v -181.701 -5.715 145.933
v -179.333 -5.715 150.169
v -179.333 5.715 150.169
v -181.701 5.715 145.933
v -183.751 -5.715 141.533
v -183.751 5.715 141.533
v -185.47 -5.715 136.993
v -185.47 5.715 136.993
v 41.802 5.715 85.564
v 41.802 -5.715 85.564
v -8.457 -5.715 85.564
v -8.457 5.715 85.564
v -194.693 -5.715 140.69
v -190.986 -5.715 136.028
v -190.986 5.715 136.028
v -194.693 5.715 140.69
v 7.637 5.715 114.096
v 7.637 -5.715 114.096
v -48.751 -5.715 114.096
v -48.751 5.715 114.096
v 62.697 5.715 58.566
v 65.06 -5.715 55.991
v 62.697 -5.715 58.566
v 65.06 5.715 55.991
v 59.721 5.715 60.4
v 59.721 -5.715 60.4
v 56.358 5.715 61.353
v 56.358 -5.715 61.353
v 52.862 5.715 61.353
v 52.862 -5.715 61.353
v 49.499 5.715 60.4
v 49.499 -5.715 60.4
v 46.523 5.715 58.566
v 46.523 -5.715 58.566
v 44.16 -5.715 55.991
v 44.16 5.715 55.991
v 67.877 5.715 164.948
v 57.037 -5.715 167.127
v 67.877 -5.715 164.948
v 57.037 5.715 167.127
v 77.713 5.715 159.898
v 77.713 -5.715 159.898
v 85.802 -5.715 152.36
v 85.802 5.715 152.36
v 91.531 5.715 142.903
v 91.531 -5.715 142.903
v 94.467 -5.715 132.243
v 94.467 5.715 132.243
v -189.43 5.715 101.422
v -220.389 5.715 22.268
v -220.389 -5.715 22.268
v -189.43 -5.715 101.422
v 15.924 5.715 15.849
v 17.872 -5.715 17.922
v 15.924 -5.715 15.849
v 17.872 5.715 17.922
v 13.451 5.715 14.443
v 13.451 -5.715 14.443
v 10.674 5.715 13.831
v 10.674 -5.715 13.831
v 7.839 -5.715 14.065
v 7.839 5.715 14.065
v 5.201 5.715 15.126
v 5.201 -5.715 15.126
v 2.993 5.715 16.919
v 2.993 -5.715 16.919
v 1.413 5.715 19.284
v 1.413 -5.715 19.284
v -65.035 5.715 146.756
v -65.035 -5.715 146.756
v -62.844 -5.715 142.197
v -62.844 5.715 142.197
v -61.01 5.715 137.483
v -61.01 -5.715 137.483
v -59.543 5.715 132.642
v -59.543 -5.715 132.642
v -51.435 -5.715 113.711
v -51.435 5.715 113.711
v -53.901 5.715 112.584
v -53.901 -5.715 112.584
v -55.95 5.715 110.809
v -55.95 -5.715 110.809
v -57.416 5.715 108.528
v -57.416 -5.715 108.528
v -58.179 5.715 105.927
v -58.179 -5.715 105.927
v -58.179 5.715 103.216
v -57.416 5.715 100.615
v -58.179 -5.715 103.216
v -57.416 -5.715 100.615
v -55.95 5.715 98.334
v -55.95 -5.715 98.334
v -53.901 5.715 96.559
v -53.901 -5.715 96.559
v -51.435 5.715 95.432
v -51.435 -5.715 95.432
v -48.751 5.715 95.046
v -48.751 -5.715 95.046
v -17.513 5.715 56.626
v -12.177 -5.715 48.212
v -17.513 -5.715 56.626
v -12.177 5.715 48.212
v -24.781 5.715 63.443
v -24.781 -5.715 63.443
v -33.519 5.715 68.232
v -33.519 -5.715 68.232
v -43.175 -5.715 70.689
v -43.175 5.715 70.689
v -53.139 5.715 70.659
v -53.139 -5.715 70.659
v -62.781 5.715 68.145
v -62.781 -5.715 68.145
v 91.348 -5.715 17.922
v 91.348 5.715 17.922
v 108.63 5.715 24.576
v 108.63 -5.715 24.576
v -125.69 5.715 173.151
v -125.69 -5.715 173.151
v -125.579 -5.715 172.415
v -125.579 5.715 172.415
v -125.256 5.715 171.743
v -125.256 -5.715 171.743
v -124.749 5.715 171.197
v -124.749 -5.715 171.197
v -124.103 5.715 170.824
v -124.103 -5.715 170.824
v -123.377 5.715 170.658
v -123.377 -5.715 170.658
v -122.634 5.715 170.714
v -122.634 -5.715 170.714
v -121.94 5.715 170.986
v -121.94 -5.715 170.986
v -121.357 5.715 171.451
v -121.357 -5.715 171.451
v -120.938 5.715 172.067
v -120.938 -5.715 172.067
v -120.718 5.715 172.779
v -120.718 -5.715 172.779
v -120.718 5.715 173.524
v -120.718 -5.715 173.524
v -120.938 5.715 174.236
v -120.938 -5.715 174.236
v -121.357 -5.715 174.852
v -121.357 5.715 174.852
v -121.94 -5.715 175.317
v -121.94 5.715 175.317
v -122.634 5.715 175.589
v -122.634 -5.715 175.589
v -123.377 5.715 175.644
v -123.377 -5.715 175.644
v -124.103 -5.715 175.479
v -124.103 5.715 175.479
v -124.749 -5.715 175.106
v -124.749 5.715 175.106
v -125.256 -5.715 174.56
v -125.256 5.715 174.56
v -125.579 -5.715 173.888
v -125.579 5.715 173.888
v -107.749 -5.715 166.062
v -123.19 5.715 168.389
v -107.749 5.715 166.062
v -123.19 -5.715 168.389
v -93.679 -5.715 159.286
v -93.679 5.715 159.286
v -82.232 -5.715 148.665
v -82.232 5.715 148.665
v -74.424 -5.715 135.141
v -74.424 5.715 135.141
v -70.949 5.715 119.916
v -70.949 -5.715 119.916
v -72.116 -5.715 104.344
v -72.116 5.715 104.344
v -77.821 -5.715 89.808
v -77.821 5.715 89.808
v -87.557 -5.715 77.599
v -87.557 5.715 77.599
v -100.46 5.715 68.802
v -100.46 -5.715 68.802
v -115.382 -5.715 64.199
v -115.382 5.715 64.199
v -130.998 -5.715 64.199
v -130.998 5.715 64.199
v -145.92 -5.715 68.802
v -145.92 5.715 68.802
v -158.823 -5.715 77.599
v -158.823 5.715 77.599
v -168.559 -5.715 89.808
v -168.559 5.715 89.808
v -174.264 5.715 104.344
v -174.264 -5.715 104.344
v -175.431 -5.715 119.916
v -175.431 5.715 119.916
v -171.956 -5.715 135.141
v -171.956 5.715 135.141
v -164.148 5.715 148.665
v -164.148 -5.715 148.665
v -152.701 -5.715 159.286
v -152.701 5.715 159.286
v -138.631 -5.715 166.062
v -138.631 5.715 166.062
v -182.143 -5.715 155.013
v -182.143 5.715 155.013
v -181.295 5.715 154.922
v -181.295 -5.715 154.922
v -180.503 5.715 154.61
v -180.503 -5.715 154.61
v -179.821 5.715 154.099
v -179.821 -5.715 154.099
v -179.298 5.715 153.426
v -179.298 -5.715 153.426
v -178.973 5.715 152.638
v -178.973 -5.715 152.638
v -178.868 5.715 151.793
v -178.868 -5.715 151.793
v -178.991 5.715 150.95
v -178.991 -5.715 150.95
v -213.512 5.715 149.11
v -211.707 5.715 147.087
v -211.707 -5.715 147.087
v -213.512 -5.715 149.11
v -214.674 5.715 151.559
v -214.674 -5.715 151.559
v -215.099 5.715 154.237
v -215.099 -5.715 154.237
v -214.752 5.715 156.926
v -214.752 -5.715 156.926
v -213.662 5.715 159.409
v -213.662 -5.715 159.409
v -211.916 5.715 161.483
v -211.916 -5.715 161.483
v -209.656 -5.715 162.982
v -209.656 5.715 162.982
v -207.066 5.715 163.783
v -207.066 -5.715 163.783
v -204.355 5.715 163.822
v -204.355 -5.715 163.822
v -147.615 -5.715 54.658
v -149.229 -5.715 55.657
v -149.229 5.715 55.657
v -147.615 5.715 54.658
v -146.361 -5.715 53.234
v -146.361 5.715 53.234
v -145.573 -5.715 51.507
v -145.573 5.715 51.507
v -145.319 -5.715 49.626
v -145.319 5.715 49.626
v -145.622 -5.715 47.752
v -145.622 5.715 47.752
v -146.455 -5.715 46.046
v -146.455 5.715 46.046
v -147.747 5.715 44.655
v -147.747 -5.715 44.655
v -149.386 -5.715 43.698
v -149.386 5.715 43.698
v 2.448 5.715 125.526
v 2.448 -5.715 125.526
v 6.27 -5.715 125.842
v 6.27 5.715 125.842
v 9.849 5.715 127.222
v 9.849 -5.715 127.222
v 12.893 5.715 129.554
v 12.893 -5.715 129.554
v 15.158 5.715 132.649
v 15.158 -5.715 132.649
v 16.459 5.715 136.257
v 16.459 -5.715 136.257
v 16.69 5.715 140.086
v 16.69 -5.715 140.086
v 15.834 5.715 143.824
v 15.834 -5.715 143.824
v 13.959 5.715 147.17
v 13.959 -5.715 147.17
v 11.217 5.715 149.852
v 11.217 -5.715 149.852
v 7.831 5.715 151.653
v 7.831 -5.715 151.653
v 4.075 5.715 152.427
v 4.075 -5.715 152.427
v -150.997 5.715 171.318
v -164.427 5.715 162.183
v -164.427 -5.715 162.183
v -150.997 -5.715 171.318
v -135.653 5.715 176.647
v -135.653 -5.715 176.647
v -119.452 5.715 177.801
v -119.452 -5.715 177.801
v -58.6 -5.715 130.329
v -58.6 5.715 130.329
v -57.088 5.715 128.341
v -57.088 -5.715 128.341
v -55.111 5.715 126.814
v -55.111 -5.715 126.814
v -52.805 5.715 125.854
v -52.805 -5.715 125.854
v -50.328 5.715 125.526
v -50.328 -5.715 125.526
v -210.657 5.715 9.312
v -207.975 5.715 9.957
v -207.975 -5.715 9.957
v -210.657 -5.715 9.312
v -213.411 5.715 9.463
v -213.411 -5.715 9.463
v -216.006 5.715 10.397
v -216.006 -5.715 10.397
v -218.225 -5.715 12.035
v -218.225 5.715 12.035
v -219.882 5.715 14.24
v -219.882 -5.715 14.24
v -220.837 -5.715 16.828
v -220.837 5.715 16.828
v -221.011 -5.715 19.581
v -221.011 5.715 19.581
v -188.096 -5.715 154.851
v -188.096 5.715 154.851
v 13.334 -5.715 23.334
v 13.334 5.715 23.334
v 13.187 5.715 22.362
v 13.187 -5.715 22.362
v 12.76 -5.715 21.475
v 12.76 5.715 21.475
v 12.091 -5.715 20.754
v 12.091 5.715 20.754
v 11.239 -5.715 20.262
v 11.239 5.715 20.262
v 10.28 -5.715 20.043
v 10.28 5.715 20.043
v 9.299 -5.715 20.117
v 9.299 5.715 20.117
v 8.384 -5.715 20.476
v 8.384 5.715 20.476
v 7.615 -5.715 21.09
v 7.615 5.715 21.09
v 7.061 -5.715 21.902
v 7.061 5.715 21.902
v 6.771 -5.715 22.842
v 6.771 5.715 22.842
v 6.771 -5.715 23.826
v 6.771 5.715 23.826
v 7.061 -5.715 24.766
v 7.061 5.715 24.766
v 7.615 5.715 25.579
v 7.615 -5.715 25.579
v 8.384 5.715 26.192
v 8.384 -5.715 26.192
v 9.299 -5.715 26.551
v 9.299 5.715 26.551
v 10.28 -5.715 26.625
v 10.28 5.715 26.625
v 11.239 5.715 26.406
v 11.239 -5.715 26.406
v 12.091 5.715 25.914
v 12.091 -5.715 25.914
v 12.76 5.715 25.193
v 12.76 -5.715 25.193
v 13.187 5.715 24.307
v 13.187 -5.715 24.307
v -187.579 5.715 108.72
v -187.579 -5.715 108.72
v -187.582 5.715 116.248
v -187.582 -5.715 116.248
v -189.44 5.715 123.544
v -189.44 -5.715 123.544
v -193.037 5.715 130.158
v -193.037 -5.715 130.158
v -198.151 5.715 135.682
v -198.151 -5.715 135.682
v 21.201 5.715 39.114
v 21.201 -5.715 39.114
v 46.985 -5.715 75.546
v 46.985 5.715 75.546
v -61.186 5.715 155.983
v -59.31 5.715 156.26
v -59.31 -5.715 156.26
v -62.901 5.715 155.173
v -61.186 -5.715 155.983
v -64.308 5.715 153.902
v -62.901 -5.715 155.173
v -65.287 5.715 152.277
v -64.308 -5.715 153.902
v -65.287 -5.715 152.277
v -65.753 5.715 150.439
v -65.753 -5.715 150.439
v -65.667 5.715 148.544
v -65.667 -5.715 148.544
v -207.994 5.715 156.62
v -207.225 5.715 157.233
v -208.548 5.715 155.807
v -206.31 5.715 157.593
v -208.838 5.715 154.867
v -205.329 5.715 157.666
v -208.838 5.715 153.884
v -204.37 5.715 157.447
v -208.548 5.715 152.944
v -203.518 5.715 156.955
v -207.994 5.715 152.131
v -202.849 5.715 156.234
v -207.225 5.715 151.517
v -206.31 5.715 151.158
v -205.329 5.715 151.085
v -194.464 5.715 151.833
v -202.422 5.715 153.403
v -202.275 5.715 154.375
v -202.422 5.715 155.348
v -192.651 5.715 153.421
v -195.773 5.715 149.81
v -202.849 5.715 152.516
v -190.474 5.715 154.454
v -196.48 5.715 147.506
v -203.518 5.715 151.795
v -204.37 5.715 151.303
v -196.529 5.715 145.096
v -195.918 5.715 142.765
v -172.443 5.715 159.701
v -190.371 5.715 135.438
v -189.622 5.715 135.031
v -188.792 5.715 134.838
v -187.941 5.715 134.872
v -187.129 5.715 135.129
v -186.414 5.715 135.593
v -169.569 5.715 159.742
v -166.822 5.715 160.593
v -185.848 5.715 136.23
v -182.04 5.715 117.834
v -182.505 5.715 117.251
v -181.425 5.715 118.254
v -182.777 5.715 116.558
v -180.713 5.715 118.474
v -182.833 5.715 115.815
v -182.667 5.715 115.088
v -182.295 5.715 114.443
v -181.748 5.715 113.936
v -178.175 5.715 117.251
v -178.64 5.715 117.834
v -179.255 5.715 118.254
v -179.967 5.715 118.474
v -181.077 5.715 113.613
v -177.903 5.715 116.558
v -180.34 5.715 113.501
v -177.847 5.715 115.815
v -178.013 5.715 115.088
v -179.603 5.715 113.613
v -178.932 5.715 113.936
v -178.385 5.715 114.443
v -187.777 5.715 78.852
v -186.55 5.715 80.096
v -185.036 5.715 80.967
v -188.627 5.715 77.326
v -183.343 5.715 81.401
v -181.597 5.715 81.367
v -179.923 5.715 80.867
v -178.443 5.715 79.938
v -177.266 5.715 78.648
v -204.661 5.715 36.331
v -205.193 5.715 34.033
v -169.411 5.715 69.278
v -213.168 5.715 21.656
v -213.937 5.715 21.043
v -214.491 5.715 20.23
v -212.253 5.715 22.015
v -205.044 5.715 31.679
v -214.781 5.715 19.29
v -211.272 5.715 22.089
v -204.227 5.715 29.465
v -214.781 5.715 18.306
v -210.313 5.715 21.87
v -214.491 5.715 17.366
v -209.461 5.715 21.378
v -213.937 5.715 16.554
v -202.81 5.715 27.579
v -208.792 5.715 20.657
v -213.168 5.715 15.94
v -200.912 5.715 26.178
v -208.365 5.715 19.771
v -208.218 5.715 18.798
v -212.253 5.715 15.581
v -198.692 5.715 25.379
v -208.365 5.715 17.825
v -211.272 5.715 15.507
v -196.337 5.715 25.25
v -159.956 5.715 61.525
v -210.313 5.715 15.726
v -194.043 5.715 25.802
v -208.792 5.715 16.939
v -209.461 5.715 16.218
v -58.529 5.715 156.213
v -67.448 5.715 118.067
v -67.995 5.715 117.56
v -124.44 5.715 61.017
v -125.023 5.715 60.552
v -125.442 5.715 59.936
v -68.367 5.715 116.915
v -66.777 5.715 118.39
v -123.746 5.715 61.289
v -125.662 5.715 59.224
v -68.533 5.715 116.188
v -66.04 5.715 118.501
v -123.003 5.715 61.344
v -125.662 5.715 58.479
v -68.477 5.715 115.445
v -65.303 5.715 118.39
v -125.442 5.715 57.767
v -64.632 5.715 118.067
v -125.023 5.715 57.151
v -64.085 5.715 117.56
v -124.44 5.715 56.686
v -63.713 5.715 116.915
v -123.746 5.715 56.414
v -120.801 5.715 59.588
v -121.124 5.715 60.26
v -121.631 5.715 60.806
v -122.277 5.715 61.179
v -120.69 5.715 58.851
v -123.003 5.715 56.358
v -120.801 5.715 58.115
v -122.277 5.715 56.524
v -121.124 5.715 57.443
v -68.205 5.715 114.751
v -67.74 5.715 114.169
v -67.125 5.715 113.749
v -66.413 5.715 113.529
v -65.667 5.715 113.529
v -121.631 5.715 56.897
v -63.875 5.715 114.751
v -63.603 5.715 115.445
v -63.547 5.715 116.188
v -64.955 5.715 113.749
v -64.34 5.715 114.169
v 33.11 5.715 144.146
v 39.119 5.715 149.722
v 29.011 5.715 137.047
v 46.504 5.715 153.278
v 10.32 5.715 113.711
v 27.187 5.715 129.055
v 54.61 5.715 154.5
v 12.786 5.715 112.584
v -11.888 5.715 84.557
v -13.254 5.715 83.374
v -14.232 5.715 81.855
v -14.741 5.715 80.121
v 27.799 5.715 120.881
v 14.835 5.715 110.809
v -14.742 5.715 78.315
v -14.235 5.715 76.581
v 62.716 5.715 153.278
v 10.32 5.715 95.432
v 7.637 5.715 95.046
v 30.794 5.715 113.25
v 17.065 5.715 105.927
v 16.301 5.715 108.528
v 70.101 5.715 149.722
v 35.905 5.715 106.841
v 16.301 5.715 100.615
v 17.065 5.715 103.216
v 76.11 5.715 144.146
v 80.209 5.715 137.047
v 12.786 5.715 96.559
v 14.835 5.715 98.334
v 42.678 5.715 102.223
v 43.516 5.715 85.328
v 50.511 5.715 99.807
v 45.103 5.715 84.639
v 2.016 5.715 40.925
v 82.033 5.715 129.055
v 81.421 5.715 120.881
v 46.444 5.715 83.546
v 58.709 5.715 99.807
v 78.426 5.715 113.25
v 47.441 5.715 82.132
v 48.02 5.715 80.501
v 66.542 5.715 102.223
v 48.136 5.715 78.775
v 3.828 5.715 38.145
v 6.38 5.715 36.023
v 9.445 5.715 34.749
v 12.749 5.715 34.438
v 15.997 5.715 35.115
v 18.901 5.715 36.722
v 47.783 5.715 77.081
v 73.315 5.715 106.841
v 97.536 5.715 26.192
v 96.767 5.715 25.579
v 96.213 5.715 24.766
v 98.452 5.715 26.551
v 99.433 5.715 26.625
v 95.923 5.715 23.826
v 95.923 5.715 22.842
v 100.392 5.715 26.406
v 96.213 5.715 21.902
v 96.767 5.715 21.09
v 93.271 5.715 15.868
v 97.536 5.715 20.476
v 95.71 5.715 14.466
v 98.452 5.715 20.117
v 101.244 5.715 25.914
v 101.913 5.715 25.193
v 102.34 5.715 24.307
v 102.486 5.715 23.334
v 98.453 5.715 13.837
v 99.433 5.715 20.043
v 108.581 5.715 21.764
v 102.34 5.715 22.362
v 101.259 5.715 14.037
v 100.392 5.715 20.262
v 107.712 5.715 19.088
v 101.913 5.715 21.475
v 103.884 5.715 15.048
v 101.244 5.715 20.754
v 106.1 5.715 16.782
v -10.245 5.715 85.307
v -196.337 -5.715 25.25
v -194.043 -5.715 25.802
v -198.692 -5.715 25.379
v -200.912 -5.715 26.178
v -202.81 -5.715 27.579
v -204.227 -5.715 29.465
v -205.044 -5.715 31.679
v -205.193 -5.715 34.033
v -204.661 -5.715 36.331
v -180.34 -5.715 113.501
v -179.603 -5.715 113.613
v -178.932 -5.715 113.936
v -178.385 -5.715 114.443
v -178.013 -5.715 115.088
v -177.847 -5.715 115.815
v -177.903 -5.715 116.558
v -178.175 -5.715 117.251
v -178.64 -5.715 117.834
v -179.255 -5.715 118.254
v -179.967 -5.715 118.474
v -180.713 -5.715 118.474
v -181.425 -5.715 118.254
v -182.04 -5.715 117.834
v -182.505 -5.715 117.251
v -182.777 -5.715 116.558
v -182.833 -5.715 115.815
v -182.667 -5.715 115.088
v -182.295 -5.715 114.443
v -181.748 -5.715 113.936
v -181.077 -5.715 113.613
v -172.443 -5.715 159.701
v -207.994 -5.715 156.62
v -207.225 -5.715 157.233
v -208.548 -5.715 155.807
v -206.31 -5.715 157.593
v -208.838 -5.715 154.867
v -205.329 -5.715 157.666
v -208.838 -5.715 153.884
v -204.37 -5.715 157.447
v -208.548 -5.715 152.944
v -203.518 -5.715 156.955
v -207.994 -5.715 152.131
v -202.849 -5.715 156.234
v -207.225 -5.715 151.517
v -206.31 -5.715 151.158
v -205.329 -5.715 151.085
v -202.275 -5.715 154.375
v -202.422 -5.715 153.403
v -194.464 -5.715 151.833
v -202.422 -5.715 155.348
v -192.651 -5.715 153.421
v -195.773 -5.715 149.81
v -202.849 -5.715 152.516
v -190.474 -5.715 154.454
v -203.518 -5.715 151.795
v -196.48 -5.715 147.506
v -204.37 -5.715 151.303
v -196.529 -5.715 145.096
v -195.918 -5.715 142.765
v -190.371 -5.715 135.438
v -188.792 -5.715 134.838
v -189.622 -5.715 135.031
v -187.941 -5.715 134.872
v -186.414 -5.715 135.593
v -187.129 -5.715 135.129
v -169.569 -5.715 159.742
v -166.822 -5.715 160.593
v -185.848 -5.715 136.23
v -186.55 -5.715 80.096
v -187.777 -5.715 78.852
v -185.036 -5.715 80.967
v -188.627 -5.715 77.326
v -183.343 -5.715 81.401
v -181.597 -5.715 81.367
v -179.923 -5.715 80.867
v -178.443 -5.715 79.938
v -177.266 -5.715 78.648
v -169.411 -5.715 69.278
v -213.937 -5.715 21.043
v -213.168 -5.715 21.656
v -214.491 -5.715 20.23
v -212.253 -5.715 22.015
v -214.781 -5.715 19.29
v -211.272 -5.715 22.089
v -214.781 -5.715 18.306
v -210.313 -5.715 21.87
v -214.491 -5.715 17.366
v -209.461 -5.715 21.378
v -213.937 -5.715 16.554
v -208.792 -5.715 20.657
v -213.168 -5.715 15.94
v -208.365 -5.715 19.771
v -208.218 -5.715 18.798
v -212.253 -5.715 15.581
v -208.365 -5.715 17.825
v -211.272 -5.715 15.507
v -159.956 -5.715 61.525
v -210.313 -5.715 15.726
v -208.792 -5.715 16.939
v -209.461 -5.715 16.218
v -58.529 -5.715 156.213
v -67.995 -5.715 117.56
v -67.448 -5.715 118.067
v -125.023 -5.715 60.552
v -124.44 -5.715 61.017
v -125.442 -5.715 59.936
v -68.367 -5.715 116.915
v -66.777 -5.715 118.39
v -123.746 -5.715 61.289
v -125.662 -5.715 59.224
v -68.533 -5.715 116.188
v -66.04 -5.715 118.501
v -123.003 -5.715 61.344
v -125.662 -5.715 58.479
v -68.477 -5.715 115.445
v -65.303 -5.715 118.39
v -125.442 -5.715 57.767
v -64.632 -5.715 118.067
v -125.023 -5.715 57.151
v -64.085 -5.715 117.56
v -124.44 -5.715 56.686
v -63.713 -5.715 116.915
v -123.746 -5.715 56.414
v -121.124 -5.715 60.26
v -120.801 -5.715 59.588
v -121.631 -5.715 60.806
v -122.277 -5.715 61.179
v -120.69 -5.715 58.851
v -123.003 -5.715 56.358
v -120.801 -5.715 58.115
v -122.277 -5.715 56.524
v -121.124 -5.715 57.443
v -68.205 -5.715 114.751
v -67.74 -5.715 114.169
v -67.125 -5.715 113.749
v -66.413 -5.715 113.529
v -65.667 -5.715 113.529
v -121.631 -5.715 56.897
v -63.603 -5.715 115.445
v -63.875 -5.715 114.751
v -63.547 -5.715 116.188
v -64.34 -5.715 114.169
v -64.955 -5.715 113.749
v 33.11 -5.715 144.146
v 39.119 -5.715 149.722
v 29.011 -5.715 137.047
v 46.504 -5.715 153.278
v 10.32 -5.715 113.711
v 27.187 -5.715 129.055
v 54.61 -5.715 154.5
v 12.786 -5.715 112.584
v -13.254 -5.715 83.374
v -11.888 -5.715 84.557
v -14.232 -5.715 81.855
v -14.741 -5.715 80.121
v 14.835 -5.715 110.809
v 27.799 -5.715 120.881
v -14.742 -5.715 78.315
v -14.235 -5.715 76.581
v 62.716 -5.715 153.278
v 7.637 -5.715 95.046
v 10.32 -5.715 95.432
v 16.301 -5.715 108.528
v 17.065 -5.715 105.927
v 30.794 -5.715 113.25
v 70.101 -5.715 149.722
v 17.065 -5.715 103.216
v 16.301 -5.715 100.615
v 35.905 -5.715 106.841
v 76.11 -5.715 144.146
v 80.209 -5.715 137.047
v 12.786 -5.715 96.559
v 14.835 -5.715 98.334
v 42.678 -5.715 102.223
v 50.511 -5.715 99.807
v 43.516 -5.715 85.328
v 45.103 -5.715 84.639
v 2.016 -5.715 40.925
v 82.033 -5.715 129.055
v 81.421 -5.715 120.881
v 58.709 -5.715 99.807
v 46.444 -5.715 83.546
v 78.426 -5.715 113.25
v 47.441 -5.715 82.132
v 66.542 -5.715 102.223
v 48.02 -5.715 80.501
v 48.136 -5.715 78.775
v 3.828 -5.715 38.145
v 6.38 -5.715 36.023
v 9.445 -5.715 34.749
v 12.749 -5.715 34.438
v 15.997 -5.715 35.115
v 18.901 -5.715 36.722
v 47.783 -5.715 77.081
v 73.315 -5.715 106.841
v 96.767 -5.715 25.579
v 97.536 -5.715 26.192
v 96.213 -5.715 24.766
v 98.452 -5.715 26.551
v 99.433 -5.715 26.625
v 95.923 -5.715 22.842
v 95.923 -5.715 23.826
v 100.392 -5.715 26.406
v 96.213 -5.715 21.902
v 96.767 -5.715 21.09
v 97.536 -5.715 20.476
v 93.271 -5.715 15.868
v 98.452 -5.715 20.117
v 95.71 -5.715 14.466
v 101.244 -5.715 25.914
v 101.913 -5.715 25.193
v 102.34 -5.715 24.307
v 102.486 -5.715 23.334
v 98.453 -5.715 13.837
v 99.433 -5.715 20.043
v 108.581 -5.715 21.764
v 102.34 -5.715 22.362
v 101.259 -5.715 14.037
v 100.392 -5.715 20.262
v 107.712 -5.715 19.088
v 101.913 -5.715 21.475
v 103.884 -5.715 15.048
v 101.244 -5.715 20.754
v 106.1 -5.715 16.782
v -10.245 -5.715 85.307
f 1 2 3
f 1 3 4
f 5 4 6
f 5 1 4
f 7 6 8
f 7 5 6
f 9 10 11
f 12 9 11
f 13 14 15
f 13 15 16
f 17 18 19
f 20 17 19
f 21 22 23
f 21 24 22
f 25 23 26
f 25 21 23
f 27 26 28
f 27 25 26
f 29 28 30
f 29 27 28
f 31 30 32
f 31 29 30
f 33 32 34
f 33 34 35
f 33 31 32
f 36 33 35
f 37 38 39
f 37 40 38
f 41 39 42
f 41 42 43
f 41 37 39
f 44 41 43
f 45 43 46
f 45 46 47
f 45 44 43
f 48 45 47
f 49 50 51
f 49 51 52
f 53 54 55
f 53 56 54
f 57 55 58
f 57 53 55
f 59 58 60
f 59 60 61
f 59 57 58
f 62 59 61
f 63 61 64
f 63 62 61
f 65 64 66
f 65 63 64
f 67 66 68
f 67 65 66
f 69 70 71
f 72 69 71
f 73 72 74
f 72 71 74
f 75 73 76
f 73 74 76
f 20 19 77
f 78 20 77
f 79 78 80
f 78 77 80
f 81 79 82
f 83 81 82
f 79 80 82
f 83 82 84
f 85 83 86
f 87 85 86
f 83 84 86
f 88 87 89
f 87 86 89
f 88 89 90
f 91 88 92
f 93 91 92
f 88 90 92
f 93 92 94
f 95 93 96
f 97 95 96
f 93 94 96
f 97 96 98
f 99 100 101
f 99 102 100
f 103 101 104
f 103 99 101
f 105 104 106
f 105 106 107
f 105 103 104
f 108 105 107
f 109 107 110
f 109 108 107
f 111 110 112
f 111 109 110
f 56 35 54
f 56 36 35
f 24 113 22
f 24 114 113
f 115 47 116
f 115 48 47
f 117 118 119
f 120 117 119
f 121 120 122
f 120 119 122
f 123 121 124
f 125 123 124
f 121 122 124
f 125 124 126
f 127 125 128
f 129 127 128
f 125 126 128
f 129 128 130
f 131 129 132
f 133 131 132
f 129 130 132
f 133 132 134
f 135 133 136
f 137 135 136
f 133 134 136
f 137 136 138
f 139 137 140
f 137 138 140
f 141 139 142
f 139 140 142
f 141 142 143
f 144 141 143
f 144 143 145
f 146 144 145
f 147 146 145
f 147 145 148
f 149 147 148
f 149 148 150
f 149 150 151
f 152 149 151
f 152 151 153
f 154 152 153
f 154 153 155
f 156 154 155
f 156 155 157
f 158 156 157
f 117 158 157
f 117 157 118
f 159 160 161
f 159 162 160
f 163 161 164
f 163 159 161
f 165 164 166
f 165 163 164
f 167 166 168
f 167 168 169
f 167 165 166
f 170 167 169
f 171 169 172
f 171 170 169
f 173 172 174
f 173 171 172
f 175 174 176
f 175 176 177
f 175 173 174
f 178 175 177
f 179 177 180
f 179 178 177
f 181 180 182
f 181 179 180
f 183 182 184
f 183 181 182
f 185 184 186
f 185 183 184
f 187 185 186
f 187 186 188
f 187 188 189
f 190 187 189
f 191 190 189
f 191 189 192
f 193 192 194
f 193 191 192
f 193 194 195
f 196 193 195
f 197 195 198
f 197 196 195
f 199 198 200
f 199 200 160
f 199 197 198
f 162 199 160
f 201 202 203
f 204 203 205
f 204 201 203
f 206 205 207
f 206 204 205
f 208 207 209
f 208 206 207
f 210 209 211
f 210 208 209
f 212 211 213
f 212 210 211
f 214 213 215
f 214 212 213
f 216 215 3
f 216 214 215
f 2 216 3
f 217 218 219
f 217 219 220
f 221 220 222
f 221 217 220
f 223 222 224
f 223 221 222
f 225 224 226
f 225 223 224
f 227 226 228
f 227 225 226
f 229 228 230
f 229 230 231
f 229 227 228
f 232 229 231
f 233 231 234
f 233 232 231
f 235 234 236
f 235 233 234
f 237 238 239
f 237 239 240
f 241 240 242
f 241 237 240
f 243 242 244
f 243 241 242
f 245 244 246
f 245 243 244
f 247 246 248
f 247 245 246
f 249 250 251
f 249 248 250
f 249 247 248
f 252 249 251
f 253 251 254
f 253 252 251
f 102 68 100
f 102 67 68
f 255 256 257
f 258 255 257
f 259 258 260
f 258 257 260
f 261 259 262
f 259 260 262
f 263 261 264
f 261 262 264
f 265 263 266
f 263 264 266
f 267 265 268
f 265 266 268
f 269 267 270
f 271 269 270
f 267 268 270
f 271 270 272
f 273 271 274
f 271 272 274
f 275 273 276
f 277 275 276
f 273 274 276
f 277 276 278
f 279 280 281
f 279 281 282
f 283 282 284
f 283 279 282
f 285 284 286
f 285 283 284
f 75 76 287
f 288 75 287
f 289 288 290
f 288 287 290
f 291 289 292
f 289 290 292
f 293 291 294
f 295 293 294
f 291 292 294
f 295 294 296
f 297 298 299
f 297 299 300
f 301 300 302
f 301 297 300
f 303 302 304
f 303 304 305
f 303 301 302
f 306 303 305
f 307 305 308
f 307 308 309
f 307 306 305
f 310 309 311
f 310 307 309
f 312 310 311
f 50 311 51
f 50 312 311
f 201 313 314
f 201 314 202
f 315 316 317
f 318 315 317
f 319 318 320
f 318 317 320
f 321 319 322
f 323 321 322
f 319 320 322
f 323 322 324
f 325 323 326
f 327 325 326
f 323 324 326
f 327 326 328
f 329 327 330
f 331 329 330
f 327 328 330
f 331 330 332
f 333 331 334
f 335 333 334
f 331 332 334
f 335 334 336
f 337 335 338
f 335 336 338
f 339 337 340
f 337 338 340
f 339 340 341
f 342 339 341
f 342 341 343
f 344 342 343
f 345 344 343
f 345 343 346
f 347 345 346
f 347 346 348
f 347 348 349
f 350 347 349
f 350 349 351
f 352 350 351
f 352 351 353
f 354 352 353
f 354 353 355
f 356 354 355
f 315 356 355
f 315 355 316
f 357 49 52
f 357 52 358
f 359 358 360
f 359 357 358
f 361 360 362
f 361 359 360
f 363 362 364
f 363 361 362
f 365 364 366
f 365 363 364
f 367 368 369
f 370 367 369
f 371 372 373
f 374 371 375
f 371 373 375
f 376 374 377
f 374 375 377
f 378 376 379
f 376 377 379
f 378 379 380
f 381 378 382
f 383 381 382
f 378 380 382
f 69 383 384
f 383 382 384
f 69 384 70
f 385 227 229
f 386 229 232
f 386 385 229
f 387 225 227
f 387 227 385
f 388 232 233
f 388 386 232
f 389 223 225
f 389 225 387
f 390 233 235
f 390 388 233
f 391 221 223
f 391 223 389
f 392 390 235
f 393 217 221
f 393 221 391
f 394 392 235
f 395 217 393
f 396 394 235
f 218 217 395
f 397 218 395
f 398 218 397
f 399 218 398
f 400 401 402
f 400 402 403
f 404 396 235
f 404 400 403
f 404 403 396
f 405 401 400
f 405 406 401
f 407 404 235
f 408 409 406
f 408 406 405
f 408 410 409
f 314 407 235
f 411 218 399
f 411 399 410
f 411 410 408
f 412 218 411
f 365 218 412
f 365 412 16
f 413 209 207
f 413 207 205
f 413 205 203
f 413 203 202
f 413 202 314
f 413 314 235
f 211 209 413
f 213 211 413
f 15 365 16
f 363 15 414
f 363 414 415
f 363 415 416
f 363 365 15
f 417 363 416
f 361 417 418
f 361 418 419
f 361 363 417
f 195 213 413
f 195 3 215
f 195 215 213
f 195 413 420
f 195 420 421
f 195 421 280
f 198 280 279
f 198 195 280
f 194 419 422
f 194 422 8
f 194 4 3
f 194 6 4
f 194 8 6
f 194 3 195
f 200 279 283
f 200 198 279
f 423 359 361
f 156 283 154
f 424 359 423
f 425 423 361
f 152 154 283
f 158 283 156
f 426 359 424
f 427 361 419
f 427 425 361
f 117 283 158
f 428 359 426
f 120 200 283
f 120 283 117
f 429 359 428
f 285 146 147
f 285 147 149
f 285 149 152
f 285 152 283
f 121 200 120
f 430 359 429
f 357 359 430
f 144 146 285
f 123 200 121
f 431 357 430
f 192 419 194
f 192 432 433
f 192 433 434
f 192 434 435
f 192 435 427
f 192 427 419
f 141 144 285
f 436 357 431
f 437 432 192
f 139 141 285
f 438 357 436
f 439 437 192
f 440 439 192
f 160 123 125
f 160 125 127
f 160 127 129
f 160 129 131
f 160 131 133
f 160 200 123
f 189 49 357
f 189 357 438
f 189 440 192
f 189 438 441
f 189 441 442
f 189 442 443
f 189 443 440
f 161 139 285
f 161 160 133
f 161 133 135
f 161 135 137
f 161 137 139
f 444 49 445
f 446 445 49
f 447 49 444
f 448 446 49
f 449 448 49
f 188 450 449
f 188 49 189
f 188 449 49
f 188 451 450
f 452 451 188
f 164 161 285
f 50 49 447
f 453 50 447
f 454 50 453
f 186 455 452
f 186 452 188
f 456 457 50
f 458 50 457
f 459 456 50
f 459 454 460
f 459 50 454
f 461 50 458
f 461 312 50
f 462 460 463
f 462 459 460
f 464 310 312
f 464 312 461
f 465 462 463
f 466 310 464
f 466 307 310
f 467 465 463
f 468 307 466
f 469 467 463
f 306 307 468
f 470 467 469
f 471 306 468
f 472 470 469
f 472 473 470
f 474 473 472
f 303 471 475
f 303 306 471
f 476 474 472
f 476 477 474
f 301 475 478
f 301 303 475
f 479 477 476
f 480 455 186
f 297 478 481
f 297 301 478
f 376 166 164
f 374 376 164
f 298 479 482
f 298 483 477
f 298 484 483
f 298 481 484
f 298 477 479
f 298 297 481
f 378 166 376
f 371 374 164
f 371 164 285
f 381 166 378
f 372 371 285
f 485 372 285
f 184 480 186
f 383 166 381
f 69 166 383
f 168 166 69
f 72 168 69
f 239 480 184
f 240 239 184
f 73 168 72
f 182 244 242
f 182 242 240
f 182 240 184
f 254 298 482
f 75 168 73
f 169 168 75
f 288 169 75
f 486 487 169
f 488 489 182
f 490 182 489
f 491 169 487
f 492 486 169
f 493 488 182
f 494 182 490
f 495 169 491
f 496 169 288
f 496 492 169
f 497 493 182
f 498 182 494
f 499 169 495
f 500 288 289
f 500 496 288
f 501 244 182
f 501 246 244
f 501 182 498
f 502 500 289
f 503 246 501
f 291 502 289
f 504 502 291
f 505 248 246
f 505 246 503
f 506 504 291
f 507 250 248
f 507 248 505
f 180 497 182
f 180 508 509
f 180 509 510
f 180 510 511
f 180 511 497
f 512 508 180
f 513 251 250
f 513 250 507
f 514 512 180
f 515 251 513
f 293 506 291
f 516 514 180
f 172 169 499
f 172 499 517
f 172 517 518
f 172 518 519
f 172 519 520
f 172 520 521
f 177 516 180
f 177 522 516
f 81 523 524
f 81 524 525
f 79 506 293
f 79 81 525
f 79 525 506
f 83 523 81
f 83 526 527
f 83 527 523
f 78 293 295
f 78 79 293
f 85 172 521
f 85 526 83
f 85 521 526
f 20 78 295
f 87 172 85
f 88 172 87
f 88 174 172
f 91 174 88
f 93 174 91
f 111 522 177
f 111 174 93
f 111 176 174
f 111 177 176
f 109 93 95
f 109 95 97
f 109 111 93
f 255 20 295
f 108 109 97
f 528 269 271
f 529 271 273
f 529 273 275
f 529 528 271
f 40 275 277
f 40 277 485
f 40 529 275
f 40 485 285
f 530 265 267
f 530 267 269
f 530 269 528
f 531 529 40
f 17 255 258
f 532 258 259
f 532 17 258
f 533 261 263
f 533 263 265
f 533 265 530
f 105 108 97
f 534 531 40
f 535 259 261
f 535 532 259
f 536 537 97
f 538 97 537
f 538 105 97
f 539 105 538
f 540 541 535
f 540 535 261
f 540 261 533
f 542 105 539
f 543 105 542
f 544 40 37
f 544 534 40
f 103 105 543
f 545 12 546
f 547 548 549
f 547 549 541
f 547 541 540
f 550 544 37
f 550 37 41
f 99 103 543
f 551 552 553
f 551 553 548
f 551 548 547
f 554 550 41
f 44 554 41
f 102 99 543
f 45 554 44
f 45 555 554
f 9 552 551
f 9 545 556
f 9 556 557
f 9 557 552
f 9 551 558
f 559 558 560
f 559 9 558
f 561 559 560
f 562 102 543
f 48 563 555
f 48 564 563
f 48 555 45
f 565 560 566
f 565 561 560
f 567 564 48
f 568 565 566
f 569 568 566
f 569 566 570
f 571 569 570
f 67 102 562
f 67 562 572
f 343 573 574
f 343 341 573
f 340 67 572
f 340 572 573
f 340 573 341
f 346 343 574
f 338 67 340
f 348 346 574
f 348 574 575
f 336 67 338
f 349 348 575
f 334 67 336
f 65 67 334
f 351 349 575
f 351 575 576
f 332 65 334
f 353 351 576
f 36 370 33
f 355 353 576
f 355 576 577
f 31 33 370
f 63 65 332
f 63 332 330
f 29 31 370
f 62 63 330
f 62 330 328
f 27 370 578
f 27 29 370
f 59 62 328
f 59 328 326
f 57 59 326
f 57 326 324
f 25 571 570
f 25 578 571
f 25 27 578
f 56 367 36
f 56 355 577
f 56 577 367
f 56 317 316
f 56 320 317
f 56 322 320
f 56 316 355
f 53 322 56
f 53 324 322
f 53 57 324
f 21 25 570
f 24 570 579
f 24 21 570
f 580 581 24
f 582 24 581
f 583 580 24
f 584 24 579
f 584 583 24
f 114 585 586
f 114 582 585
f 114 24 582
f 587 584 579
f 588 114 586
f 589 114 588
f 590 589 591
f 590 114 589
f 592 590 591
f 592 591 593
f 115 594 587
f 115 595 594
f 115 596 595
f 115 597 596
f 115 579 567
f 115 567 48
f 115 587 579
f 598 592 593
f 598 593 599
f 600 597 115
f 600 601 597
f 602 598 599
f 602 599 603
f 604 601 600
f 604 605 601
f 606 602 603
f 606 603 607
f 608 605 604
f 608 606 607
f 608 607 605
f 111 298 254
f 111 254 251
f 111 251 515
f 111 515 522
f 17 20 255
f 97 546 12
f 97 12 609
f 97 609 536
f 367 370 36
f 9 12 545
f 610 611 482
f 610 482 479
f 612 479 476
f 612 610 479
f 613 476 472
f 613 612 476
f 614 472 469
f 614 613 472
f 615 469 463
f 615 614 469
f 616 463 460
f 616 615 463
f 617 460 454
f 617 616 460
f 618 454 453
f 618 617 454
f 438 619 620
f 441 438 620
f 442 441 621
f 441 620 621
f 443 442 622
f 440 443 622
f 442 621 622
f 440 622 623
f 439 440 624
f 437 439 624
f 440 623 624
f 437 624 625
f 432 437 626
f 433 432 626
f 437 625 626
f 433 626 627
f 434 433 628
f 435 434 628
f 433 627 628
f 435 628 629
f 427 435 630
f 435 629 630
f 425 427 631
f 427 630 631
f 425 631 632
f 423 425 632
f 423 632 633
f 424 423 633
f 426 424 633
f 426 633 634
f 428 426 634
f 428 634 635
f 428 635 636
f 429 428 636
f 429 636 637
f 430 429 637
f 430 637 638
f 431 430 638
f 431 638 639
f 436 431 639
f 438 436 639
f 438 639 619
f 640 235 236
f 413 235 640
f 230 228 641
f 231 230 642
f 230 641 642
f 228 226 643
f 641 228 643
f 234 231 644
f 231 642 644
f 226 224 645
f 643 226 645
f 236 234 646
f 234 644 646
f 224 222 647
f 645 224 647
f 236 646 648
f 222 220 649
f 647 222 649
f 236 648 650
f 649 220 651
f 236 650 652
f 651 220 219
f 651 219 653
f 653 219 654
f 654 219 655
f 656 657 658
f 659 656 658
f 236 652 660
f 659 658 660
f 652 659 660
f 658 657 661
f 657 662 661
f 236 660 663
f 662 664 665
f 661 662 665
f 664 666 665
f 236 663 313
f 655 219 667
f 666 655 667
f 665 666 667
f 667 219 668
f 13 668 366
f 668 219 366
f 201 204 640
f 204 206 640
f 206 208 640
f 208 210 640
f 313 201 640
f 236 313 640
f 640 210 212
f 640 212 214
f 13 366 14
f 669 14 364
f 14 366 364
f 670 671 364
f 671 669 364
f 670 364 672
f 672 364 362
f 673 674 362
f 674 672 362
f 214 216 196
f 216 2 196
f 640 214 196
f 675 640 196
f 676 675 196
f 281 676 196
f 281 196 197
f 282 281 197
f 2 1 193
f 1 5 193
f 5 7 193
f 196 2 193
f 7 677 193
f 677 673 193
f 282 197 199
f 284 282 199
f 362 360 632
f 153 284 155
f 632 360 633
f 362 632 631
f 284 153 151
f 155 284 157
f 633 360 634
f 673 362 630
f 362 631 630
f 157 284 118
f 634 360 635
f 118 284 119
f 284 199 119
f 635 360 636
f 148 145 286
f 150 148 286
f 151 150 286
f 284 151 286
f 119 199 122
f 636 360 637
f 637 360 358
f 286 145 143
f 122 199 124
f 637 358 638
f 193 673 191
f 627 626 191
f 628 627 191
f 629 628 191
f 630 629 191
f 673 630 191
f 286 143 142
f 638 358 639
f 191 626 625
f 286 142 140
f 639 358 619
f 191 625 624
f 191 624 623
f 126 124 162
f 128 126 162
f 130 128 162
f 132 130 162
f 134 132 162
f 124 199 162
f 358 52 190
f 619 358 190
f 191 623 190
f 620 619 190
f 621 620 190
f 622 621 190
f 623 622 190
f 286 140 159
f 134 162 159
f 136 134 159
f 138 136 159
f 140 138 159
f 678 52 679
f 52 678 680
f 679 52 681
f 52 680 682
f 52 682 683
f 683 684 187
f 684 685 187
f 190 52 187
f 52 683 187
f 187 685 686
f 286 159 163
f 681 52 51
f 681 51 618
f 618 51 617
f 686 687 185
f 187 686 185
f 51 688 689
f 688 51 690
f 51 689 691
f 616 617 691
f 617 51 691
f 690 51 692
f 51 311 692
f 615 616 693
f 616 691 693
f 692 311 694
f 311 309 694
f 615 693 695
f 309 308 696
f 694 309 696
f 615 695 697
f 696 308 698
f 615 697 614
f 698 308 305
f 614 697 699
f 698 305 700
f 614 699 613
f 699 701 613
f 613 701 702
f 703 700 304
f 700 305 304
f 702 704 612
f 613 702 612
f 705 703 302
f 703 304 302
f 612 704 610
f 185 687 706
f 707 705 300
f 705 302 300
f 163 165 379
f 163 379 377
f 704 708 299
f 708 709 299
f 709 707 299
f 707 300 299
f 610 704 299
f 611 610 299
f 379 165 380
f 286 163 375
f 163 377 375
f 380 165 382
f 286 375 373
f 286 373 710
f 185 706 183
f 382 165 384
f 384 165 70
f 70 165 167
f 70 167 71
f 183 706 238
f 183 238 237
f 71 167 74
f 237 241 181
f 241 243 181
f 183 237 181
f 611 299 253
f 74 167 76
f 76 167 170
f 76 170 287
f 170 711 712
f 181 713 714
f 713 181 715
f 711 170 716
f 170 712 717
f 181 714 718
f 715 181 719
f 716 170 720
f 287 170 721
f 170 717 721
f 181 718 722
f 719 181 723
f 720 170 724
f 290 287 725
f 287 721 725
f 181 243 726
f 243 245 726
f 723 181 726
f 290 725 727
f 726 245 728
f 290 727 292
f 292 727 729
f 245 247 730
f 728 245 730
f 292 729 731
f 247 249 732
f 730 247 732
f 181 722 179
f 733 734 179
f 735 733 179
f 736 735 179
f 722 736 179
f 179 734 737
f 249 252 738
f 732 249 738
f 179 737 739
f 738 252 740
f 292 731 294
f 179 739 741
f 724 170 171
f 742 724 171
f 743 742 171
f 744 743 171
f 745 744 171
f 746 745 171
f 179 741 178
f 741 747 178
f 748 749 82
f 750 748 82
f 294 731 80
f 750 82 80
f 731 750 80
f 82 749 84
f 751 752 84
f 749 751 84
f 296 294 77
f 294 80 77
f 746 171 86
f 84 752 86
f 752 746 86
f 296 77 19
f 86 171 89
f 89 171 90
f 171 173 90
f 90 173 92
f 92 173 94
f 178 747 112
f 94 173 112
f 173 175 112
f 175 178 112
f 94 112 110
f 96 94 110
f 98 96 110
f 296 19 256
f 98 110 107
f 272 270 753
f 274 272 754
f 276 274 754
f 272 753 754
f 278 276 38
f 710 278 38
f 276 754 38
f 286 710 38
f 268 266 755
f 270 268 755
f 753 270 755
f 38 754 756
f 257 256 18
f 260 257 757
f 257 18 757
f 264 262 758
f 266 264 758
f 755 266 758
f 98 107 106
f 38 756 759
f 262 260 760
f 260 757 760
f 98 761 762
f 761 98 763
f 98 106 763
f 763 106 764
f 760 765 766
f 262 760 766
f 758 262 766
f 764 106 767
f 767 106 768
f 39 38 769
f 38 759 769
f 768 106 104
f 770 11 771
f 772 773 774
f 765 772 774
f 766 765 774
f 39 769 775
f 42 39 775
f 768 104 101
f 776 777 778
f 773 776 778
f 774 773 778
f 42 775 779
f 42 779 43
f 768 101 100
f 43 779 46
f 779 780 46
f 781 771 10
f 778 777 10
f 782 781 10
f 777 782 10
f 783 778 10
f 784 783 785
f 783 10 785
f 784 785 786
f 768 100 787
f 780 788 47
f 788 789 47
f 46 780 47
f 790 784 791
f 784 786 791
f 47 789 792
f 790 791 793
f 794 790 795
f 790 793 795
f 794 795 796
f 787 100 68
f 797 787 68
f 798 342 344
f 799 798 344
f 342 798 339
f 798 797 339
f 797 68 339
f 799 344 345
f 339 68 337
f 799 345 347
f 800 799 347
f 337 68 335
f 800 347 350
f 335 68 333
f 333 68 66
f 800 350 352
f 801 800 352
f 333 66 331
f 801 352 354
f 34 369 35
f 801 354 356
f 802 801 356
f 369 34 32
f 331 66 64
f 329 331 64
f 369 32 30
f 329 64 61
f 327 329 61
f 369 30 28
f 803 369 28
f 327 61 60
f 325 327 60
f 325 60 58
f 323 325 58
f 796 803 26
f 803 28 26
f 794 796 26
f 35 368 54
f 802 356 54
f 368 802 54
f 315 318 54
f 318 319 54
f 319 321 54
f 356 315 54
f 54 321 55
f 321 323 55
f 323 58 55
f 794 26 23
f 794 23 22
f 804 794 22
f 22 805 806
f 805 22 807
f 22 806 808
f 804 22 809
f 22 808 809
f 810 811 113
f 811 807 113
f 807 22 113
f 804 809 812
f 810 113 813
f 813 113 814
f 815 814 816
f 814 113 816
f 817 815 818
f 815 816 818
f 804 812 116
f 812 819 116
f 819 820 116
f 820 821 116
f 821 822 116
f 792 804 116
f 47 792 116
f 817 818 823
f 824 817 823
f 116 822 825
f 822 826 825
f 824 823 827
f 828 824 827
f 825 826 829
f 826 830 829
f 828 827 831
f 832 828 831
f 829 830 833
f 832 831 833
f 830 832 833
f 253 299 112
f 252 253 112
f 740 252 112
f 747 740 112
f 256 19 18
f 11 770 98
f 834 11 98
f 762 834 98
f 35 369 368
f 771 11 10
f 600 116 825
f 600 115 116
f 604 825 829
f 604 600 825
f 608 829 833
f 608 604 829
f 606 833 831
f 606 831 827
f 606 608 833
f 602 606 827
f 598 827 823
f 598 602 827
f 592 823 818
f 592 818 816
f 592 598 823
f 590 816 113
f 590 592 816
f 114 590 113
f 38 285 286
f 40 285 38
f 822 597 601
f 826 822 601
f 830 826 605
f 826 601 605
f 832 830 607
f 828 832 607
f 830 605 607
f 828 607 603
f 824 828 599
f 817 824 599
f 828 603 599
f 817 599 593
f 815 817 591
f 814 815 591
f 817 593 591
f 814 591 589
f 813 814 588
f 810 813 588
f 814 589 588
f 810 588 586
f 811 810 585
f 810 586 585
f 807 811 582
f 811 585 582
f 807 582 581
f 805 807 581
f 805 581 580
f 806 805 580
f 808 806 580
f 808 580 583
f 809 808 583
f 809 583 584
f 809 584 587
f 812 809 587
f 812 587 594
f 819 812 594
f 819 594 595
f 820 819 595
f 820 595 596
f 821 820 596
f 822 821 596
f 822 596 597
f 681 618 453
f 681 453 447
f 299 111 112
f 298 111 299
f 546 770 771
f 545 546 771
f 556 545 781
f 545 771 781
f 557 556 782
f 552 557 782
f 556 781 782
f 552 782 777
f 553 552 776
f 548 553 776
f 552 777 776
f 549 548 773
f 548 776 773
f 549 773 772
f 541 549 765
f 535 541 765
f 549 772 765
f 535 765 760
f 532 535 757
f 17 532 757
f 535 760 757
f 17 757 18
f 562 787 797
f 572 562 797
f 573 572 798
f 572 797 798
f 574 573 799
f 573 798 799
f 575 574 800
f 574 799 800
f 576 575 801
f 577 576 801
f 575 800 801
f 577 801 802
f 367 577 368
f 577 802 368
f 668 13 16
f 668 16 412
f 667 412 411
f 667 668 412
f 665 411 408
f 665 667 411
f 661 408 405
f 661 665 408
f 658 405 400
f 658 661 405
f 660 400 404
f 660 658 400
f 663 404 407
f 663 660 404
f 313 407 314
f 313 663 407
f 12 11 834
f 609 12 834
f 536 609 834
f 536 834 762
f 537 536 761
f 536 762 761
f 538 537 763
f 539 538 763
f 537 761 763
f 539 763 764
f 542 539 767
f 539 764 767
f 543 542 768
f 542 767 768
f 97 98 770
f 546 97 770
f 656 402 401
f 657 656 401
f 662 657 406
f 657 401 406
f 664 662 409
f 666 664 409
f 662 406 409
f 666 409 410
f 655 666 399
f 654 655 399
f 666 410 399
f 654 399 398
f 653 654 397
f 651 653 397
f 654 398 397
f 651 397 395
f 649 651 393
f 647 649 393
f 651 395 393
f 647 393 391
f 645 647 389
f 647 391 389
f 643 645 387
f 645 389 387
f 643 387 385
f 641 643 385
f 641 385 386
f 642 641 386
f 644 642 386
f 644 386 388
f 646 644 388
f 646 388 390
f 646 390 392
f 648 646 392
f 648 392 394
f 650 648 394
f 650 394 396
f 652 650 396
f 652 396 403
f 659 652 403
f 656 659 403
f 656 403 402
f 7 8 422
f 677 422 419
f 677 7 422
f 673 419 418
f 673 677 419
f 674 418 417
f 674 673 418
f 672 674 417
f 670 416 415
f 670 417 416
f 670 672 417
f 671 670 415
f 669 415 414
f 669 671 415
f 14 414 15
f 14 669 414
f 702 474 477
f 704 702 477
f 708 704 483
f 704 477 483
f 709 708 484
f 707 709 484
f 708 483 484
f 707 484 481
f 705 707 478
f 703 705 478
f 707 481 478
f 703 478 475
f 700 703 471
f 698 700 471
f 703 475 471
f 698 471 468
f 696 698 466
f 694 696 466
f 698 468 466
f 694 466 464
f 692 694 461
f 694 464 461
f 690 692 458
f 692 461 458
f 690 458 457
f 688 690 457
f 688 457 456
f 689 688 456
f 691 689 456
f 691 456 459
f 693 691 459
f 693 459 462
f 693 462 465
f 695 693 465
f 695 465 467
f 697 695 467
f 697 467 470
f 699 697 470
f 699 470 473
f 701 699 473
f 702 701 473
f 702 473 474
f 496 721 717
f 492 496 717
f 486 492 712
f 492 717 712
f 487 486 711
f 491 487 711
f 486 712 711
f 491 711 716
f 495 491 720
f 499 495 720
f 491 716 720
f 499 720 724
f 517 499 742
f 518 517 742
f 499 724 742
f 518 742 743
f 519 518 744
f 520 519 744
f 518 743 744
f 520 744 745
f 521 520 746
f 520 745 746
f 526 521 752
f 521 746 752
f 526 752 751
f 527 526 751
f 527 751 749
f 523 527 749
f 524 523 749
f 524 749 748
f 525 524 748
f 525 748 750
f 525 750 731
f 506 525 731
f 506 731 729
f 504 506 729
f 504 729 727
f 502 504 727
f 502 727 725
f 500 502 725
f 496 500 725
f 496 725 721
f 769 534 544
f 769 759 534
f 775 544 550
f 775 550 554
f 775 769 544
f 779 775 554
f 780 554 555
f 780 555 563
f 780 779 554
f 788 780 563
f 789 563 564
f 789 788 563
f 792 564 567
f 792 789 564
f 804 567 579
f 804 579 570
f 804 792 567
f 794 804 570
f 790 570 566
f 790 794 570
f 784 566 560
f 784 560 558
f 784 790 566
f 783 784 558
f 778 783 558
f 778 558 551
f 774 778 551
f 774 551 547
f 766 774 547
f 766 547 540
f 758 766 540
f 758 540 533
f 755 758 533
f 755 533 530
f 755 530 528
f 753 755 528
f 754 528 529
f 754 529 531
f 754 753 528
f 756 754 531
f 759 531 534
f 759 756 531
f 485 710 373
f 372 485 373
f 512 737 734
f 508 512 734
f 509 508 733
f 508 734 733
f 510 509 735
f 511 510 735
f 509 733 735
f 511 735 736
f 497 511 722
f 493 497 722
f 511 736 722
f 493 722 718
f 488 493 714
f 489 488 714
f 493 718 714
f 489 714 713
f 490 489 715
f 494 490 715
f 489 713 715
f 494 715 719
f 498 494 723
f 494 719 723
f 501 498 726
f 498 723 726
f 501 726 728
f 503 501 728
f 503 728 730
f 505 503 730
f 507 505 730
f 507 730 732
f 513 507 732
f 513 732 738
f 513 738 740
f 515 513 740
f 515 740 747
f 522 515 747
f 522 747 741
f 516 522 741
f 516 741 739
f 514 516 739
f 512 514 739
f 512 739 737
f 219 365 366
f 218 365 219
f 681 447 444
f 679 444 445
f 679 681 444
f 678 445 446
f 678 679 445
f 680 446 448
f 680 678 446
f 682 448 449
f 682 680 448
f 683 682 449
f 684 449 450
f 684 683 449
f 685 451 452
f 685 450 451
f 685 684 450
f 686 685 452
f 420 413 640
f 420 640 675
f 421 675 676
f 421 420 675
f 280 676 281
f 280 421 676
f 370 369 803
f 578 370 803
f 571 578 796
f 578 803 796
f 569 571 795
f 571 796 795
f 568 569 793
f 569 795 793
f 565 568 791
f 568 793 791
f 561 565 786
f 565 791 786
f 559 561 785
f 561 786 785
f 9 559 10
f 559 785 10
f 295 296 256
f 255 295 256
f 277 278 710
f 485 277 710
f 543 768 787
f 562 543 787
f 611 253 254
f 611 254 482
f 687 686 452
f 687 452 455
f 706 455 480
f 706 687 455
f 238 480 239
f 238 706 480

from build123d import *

# Parameters (mm, degrees)
SKETCH1_R             = 52.3875
SKETCH1_R_2           = 27.5
BOSS_EXTRUDE1_DEPTH   = 5.715
M6_CLEARANCE_HOLE1_D  = 6.6
F_5_0MM_DOWEL_HOLE1_D = 5
CIRPATTERN1_COUNT     = 4
CUT_EXTRUDE3_DEPTH    = 284.979078357
CUT_EXTRUDE4_DEPTH    = 284.979078357


with BuildPart() as part:
    # Sketch1 → Boss-Extrude1 (new, symmetric)
    with BuildSketch(Plane(origin=(0, 0, 0), x_dir=(1, 0, 0), z_dir=(0, 1, 0))):
        with BuildLine():
            Line((-62.780706514, -68.14502812), (-207.974881785, -9.956762437))
            ThreePointArc((-207.974881785, -9.956762437), (-218.225236723, -12.034965467), (-220.388836369, -22.267635732))
            Line((-220.388836369, -22.267635732), (-189.430137427, -101.422354045))
            ThreePointArc((-189.430137427, -101.422354045), (-188.283833694, -119.954004575), (-198.151371623, -135.681934472))
            Line((-198.151371623, -135.681934472), (-211.707233022, -147.086764223))
            ThreePointArc((-211.707233022, -147.086764223), (-214.295764489, -158.206433226), (-204.355245166, -163.82191268))
            Line((-204.355245166, -163.82191268), (-172.443362527, -159.700770109))
            ThreePointArc((-172.443362527, -159.700770109), (-168.164823601, -160.06920649), (-164.426538493, -162.182702446))
            ThreePointArc((-164.426538493, -162.182702446), (-143.500663309, -174.487669009), (-119.452254321, -177.801047868))
            Line((-119.452254321, -177.801047868), (57.036931174, -167.126674483))
            ThreePointArc((57.036931174, -167.126674483), (82.017871973, -156.408307566), (94.466622628, -132.24305566))
            Line((94.466622628, -132.24305566), (108.629935196, -24.576488538))
            ThreePointArc((108.629935196, -24.576488538), (102.609116202, -14.445444869), (91.348434445, -17.92184438))
            Line((91.348434445, -17.92184438), (65.060480918, -55.990558325))
            ThreePointArc((65.060480918, -55.990558325), (54.61, -61.474087679), (44.159519082, -55.990558325))
            Line((44.159519082, -55.990558325), (17.871565555, -17.92184438))
            ThreePointArc((17.871565555, -17.92184438), (9.247910088, -13.841666007), (1.412558245, -19.284326264))
            Line((1.412558245, -19.284326264), (-12.176603989, -48.212200061))
            ThreePointArc((-12.176603989, -48.212200061), (-33.518744337, -68.231765471), (-62.780706514, -68.14502812))
        make_face()
        with Locations(Location((-123.19, -116.001477372, 0), (0, 0, 270))):
            Circle(SKETCH1_R, mode=Mode.SUBTRACT)
        with Locations(Location((54.61, -127, 0), (0, 0, 270))):
            Circle(SKETCH1_R_2, mode=Mode.SUBTRACT)
    extrude(amount=BOSS_EXTRUDE1_DEPTH, both=True)

    # M6 Clearance Hole1 (through all)
    with Locations(Plane(origin=(0, -5.715, 0), x_dir=(-1, 0, 0), z_dir=(0, -1, 0))):
        with Locations((-222.084502927, -125.821700696), (-10.033704867, -23.334197365), (-99.186295133, -23.334197365), (211.518182886, -18.798178744), (205.575185514, -154.375359311)):
            Hole(M6_CLEARANCE_HOLE1_D / 2)

    # Ø5.0mm Dowel Hole1 (through all)
    with Locations(Plane(origin=(0, 5.715, 0), x_dir=(1, 0, 0), z_dir=(0, 1, 0))):
        with Locations((-123.19, -173.151477372)):
            f_5_0mm_dowel_hole1 = Hole(F_5_0MM_DOWEL_HOLE1_D / 2)

    # CirPattern1: Ø5.0mm Dowel Hole1 ×4 about axis
    cirpattern1_axis = Axis((-123.19, 0, 116.001477372), (0, 1, 0))
    for i in range(1, CIRPATTERN1_COUNT):
        add(f_5_0mm_dowel_hole1.rotate(cirpattern1_axis, i * 360 / CIRPATTERN1_COUNT), mode=Mode.SUBTRACT)

    # Sketch12 → Cut-Extrude3 (cut, through all)
    with BuildSketch(Plane.XZ.offset(5.715)):
        with BuildLine():
            Line((-14.234653979, 76.580666612), (2.016277078, 40.924992231))
            ThreePointArc((2.016277078, 40.924992231), (11.084872861, 34.469497273), (21.201297863, 39.113933708))
            Line((21.201297863, 39.113933708), (46.984841737, 75.545913676))
            ThreePointArc((46.984841737, 75.545913676), (47.441443369, 82.132150292), (41.801580719, 85.564197365))
            Line((41.801580719, 85.564197365), (-8.456504121, 85.564197365))
            ThreePointArc((-8.456504121, 85.564197365), (-13.797169823, 82.649279585), (-14.234653979, 76.580666612))
        make_face()
        with BuildLine():
            Line((-204.660650751, 36.331409888), (-188.626913597, 77.326218823))
            ThreePointArc((-188.626913597, 77.326218823), (-183.343464985, 81.400582198), (-177.265672517, 78.648182362))
            ThreePointArc((-177.265672517, 78.648182362), (-164.864290964, 65.181201114), (-149.229324423, 55.657458697))
            ThreePointArc((-149.229324423, 55.657458697), (-145.319075006, 49.625624375), (-149.386073966, 43.698348841))
            Line((-149.386073966, 43.698348841), (-194.042740287, 25.801666969))
            ThreePointArc((-194.042740287, 25.801666969), (-202.810079512, 27.579196728), (-204.660650751, 36.331409888))
        make_face()
        with BuildLine():
            Line((-190.985681304, 136.027573744), (-194.692687992, 140.689511725))
            ThreePointArc((-194.692687992, 140.689511725), (-195.773357295, 149.809803058), (-188.096484537, 154.850952212))
            Line((-188.096484537, 154.850952212), (-182.142551509, 155.01295786))
            ThreePointArc((-182.142551509, 155.01295786), (-179.298484939, 153.425933155), (-179.332786017, 150.169219243))
            ThreePointArc((-179.332786017, 150.169219243), (-182.766707481, 143.751485155), (-185.46990532, 136.993390091))
            ThreePointArc((-185.46990532, 136.993390091), (-187.940827525, 134.871620657), (-190.985681304, 136.027573744))
        make_face()
    extrude(amount=-CUT_EXTRUDE3_DEPTH, mode=Mode.SUBTRACT)

    # Sketch13 → Cut-Extrude4 (cut, through all)
    with BuildSketch(Plane.XZ.offset(5.715)):
        with BuildLine():
            Line((7.636577505, 114.096477372), (-48.751422495, 114.096477372))
            ThreePointArc((-48.751422495, 114.096477372), (-58.276422495, 104.571477372), (-48.751422495, 95.046477372))
            Line((-48.751422495, 95.046477372), (7.636577505, 95.046477372))
            ThreePointArc((7.636577505, 95.046477372), (17.161577505, 104.571477372), (7.636577505, 114.096477372))
        make_face()
        with BuildLine():
            ThreePointArc((-59.54342217, 132.642118181), (-56.149544678, 127.512420027), (-50.328184067, 125.526477372))
            Line((-50.328184067, 125.526477372), (2.447685954, 125.526477372))
            ThreePointArc((2.447685954, 125.526477372), (16.711385269, 138.163192745), (4.074669896, 152.42689206))
            Line((4.074669896, 152.42689206), (-58.528880044, 156.213263816))
            Line((-58.528880044, 156.213263816), (-59.309504972, 156.260477372))
            ThreePointArc((-59.309504972, 156.260477372), (-64.85762699, 153.125613078), (-65.035173244, 146.755565245))
            ThreePointArc((-65.035173244, 146.755565245), (-61.881820392, 139.857397165), (-59.54342217, 132.642118181))
        make_face()
    extrude(amount=-CUT_EXTRUDE4_DEPTH, mode=Mode.SUBTRACT)


solid = part.part
